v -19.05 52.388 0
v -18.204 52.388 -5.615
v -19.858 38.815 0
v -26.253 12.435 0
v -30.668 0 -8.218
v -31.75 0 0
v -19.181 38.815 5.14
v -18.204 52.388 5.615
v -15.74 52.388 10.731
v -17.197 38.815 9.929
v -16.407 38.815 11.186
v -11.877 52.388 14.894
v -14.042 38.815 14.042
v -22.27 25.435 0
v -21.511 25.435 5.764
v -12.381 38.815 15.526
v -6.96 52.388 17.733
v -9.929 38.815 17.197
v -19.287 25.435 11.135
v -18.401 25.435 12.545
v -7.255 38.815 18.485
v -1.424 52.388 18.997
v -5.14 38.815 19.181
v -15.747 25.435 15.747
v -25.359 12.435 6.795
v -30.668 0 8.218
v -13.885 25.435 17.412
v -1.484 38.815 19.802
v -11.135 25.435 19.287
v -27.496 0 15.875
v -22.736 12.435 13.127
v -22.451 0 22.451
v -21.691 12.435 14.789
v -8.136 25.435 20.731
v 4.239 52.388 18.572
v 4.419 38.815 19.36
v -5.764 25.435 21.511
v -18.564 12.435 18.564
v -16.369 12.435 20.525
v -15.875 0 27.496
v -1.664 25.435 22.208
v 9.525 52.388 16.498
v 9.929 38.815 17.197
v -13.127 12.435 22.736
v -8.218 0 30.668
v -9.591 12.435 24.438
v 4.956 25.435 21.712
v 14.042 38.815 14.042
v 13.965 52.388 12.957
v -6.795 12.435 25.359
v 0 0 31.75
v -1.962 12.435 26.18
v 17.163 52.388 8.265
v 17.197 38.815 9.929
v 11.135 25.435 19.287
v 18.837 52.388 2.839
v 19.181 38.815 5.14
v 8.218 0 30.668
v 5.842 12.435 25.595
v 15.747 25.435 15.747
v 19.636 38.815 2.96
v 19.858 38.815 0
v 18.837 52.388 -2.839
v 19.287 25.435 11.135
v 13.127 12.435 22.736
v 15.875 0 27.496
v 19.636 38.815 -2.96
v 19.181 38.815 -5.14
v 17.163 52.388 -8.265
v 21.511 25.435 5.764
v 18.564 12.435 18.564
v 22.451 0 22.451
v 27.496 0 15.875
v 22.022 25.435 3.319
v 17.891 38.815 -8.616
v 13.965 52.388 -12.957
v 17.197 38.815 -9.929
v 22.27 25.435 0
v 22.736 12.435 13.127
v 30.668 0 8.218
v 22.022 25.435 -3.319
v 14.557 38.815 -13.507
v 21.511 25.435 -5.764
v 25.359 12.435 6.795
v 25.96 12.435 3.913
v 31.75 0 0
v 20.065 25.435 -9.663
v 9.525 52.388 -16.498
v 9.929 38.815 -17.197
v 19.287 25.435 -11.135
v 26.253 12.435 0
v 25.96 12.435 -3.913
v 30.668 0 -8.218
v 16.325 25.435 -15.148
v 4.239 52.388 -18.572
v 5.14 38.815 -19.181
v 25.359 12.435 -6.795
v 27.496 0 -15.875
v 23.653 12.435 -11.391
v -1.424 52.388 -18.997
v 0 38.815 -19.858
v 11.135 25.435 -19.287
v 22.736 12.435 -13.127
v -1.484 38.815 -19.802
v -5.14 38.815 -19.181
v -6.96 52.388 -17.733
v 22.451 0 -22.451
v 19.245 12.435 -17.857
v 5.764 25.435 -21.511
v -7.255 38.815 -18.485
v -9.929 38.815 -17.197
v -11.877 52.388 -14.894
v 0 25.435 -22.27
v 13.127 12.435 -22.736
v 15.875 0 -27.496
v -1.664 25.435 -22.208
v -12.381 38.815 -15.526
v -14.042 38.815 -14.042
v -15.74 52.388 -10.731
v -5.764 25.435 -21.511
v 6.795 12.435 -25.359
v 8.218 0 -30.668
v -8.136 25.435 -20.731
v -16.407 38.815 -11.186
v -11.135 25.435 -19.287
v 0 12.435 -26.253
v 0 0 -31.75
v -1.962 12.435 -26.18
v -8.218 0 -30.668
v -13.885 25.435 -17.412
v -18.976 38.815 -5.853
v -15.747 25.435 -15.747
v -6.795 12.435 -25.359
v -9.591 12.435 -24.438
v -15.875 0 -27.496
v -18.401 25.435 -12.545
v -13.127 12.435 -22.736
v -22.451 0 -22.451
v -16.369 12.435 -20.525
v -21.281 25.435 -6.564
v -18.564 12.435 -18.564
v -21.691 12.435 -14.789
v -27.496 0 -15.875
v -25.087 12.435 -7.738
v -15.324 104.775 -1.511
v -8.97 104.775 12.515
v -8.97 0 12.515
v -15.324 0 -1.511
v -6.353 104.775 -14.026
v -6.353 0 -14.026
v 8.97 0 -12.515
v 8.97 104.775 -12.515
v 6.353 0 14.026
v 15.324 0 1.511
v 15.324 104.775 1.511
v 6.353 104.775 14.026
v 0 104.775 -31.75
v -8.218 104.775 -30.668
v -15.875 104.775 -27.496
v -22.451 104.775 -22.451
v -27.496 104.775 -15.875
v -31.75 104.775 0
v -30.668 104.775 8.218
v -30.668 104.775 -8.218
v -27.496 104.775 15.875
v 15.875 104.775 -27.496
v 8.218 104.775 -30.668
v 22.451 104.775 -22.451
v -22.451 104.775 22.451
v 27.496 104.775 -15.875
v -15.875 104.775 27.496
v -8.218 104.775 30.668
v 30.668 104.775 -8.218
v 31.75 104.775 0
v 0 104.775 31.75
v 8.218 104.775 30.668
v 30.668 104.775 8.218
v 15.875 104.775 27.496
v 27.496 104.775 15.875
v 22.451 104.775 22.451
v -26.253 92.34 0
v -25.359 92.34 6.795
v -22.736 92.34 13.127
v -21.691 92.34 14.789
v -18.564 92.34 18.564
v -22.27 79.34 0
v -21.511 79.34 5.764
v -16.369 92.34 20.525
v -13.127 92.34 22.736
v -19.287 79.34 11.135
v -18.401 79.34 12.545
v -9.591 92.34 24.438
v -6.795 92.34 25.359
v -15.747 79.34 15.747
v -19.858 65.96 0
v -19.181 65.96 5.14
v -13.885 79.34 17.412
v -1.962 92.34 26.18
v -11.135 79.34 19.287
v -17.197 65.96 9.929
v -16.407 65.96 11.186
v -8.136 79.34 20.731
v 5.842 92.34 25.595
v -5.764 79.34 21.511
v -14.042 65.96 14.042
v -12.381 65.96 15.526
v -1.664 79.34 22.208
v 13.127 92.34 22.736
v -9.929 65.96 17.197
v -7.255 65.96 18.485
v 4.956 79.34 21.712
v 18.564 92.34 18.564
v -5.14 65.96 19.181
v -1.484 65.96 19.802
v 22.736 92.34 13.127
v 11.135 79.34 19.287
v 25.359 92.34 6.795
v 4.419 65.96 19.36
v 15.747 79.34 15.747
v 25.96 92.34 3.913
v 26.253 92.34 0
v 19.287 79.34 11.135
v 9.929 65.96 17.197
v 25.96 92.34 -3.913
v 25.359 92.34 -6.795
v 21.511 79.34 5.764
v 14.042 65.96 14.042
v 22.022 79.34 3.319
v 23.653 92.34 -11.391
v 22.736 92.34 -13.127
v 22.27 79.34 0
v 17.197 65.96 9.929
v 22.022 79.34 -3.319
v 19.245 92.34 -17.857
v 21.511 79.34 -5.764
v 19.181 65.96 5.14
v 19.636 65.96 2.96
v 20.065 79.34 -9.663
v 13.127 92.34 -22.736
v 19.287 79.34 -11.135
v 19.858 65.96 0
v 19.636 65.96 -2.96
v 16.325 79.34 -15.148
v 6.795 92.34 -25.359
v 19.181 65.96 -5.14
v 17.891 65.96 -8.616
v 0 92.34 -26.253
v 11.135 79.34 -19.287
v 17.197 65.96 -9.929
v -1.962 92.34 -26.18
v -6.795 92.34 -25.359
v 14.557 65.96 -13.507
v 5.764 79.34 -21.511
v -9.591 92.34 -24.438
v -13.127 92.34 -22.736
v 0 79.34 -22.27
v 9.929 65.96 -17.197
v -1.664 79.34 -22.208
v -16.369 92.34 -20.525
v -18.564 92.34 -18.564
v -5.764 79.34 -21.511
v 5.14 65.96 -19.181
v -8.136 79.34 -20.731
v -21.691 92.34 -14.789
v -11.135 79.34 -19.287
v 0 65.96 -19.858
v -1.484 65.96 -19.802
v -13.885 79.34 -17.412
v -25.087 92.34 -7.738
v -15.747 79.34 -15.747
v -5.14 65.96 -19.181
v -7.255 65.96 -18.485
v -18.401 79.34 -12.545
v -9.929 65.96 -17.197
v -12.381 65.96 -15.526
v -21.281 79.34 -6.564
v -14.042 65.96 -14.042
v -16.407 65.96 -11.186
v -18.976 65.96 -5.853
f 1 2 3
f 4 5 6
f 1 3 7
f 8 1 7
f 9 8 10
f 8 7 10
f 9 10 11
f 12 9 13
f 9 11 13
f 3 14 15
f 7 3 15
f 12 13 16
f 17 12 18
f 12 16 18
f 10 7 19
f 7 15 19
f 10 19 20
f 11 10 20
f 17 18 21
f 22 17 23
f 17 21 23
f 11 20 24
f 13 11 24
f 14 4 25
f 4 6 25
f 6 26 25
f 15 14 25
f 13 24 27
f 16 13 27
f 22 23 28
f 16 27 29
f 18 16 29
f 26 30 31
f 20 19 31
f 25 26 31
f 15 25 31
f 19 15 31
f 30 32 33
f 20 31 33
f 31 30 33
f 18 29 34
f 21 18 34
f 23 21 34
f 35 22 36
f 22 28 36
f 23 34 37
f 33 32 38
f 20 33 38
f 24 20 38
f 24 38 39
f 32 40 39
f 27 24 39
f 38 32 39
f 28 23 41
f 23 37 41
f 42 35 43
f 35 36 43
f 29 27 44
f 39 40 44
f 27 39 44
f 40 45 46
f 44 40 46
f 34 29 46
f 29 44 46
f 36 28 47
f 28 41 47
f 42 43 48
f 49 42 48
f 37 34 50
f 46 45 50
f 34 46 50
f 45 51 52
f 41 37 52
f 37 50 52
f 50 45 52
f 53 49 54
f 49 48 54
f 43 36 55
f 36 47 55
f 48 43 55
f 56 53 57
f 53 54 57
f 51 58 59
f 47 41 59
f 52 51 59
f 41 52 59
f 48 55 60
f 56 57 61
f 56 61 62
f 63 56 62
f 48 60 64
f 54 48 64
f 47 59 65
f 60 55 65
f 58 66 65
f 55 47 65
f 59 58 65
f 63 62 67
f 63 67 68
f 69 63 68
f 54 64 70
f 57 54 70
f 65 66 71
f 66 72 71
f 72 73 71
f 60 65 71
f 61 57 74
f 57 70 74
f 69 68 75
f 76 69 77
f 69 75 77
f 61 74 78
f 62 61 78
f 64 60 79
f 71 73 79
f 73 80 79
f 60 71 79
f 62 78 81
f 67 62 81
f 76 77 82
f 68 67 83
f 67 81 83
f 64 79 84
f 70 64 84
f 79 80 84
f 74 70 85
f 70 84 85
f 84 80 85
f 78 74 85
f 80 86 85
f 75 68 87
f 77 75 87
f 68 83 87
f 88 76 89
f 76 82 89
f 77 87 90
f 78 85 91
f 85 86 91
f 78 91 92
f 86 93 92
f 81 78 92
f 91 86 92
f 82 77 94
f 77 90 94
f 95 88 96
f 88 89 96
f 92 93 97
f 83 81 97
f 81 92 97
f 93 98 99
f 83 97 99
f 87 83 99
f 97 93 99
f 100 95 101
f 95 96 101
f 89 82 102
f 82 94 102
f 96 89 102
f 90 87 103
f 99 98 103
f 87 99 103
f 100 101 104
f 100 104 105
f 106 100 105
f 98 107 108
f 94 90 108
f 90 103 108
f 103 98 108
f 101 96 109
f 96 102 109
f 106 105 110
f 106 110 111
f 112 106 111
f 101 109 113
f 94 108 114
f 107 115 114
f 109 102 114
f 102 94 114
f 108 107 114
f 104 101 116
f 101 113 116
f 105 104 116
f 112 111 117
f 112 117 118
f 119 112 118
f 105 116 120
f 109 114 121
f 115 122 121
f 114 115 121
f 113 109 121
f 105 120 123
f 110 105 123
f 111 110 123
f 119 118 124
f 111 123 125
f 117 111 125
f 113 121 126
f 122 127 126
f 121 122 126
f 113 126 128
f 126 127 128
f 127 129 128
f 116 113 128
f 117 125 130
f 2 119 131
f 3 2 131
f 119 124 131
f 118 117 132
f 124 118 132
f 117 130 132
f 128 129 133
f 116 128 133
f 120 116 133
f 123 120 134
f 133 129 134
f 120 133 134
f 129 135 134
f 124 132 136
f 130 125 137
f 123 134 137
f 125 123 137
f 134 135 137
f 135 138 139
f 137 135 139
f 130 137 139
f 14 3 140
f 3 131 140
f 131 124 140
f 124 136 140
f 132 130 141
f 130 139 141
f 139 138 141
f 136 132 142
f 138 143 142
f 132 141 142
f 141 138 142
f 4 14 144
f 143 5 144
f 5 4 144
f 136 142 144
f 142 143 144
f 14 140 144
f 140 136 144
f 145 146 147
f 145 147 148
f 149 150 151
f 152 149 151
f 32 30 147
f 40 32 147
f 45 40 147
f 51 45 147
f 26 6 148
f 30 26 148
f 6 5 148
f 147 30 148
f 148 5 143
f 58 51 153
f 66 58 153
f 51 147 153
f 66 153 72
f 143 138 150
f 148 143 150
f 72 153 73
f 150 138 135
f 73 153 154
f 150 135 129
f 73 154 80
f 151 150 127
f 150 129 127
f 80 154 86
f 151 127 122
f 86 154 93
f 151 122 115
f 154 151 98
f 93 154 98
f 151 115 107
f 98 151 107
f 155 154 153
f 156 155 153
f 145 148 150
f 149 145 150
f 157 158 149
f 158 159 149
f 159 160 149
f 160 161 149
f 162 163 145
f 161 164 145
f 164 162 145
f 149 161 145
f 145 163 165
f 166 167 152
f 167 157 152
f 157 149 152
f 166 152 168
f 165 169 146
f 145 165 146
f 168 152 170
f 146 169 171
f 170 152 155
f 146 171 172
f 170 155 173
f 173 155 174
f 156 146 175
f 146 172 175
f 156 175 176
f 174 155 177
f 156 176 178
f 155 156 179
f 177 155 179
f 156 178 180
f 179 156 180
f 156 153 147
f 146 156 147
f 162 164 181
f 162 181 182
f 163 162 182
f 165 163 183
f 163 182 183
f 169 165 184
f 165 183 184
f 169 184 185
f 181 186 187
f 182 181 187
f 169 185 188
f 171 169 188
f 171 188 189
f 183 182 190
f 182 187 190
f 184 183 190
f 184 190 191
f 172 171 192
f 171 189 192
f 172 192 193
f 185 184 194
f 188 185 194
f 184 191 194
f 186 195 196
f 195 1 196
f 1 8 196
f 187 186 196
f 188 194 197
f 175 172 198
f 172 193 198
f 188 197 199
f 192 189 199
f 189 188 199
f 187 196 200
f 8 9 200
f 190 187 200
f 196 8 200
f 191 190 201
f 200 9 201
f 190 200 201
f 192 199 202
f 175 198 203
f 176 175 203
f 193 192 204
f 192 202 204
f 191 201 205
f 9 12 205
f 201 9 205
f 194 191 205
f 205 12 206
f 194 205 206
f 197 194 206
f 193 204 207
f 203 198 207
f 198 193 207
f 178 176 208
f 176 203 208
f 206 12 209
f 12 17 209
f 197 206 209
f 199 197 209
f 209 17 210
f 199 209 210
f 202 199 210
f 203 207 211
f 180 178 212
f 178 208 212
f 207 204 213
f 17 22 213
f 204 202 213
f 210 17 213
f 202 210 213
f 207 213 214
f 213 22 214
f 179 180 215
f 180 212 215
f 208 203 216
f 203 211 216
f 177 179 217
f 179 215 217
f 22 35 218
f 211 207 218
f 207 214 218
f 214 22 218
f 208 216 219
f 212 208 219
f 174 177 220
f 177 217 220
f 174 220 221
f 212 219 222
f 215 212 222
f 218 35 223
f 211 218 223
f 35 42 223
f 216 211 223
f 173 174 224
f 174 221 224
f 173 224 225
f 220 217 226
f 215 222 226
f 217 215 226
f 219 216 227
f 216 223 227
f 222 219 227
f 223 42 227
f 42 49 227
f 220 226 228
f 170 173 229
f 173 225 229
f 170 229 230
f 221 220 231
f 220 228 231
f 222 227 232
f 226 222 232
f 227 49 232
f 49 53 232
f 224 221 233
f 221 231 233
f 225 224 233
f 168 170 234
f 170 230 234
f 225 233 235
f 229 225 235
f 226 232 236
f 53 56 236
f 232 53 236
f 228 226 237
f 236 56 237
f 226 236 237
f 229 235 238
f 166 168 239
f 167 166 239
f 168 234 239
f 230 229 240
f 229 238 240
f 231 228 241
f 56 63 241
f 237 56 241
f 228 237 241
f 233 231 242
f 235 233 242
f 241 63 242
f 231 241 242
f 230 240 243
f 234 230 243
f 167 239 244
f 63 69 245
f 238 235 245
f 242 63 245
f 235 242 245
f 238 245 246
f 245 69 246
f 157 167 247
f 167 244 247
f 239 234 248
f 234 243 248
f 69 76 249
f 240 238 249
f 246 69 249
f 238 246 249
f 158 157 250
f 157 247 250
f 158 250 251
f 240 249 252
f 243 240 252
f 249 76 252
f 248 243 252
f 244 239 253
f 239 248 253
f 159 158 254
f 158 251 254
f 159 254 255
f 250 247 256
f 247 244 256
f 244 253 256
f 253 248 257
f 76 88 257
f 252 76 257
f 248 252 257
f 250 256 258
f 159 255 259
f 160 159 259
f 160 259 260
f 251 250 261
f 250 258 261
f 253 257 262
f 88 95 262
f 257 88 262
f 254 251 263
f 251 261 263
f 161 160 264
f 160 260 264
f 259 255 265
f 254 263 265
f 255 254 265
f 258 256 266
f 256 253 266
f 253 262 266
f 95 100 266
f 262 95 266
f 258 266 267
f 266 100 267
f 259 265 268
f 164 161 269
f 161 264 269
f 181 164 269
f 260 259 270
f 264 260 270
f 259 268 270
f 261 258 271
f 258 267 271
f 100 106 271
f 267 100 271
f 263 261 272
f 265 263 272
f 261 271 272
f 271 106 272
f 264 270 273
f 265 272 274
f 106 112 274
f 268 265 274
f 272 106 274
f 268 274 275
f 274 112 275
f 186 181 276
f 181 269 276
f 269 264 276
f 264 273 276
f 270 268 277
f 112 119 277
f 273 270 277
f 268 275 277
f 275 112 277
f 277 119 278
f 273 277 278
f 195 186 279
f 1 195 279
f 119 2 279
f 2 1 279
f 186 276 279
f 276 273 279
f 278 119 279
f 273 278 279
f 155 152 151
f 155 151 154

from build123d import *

# Parameters (mm, degrees)
SKETCH1_R           = 19.05
BOSS_EXTRUDE1_DEPTH = 104.775
CUT_EXTRUDE1_DEPTH  = 104.775


with BuildPart() as part:
    # Sketch1 → Boss-Extrude1 (new body)
    with BuildSketch(Plane(origin=(0, 0, 0), x_dir=(1, 0, 0), z_dir=(0, 1, 0))):
        Circle(SKETCH1_R)
    extrude(amount=BOSS_EXTRUDE1_DEPTH)

    # Sketch2 → Cut-Extrude1 (cut)
    with BuildSketch(Plane.XZ):
        Polygon((-15.323636661, -1.510781079), (-6.353443536, -14.026049167), (8.970193125, -12.515268087), (15.323636661, 1.510781079), (6.353443536, 14.026049167), (-8.970193125, 12.515268087), align=None)
    extrude(amount=-CUT_EXTRUDE1_DEPTH, mode=Mode.SUBTRACT)

    # Sketch4 → Revolve3 (revolve)
    with BuildSketch(Plane.XY):
        with BuildLine():
            Line((-19.05, 52.3875), (-19.05, 104.775))
            Line((-19.05, 104.775), (-31.75, 104.775))
            ThreePointArc((-31.75, 104.775), (-22.270325917, 79.339958869), (-19.05, 52.3875))
        make_face()
        with BuildLine():
            Line((-19.05, 0), (-19.05, 52.3875))
            ThreePointArc((-19.05, 52.3875), (-22.270325917, 25.435041131), (-31.75, 0))
            Line((-31.75, 0), (-19.05, 0))
        make_face()
    revolve(axis=Axis((0, 0, 0), (0, 1, 0)))


solid = part.part
